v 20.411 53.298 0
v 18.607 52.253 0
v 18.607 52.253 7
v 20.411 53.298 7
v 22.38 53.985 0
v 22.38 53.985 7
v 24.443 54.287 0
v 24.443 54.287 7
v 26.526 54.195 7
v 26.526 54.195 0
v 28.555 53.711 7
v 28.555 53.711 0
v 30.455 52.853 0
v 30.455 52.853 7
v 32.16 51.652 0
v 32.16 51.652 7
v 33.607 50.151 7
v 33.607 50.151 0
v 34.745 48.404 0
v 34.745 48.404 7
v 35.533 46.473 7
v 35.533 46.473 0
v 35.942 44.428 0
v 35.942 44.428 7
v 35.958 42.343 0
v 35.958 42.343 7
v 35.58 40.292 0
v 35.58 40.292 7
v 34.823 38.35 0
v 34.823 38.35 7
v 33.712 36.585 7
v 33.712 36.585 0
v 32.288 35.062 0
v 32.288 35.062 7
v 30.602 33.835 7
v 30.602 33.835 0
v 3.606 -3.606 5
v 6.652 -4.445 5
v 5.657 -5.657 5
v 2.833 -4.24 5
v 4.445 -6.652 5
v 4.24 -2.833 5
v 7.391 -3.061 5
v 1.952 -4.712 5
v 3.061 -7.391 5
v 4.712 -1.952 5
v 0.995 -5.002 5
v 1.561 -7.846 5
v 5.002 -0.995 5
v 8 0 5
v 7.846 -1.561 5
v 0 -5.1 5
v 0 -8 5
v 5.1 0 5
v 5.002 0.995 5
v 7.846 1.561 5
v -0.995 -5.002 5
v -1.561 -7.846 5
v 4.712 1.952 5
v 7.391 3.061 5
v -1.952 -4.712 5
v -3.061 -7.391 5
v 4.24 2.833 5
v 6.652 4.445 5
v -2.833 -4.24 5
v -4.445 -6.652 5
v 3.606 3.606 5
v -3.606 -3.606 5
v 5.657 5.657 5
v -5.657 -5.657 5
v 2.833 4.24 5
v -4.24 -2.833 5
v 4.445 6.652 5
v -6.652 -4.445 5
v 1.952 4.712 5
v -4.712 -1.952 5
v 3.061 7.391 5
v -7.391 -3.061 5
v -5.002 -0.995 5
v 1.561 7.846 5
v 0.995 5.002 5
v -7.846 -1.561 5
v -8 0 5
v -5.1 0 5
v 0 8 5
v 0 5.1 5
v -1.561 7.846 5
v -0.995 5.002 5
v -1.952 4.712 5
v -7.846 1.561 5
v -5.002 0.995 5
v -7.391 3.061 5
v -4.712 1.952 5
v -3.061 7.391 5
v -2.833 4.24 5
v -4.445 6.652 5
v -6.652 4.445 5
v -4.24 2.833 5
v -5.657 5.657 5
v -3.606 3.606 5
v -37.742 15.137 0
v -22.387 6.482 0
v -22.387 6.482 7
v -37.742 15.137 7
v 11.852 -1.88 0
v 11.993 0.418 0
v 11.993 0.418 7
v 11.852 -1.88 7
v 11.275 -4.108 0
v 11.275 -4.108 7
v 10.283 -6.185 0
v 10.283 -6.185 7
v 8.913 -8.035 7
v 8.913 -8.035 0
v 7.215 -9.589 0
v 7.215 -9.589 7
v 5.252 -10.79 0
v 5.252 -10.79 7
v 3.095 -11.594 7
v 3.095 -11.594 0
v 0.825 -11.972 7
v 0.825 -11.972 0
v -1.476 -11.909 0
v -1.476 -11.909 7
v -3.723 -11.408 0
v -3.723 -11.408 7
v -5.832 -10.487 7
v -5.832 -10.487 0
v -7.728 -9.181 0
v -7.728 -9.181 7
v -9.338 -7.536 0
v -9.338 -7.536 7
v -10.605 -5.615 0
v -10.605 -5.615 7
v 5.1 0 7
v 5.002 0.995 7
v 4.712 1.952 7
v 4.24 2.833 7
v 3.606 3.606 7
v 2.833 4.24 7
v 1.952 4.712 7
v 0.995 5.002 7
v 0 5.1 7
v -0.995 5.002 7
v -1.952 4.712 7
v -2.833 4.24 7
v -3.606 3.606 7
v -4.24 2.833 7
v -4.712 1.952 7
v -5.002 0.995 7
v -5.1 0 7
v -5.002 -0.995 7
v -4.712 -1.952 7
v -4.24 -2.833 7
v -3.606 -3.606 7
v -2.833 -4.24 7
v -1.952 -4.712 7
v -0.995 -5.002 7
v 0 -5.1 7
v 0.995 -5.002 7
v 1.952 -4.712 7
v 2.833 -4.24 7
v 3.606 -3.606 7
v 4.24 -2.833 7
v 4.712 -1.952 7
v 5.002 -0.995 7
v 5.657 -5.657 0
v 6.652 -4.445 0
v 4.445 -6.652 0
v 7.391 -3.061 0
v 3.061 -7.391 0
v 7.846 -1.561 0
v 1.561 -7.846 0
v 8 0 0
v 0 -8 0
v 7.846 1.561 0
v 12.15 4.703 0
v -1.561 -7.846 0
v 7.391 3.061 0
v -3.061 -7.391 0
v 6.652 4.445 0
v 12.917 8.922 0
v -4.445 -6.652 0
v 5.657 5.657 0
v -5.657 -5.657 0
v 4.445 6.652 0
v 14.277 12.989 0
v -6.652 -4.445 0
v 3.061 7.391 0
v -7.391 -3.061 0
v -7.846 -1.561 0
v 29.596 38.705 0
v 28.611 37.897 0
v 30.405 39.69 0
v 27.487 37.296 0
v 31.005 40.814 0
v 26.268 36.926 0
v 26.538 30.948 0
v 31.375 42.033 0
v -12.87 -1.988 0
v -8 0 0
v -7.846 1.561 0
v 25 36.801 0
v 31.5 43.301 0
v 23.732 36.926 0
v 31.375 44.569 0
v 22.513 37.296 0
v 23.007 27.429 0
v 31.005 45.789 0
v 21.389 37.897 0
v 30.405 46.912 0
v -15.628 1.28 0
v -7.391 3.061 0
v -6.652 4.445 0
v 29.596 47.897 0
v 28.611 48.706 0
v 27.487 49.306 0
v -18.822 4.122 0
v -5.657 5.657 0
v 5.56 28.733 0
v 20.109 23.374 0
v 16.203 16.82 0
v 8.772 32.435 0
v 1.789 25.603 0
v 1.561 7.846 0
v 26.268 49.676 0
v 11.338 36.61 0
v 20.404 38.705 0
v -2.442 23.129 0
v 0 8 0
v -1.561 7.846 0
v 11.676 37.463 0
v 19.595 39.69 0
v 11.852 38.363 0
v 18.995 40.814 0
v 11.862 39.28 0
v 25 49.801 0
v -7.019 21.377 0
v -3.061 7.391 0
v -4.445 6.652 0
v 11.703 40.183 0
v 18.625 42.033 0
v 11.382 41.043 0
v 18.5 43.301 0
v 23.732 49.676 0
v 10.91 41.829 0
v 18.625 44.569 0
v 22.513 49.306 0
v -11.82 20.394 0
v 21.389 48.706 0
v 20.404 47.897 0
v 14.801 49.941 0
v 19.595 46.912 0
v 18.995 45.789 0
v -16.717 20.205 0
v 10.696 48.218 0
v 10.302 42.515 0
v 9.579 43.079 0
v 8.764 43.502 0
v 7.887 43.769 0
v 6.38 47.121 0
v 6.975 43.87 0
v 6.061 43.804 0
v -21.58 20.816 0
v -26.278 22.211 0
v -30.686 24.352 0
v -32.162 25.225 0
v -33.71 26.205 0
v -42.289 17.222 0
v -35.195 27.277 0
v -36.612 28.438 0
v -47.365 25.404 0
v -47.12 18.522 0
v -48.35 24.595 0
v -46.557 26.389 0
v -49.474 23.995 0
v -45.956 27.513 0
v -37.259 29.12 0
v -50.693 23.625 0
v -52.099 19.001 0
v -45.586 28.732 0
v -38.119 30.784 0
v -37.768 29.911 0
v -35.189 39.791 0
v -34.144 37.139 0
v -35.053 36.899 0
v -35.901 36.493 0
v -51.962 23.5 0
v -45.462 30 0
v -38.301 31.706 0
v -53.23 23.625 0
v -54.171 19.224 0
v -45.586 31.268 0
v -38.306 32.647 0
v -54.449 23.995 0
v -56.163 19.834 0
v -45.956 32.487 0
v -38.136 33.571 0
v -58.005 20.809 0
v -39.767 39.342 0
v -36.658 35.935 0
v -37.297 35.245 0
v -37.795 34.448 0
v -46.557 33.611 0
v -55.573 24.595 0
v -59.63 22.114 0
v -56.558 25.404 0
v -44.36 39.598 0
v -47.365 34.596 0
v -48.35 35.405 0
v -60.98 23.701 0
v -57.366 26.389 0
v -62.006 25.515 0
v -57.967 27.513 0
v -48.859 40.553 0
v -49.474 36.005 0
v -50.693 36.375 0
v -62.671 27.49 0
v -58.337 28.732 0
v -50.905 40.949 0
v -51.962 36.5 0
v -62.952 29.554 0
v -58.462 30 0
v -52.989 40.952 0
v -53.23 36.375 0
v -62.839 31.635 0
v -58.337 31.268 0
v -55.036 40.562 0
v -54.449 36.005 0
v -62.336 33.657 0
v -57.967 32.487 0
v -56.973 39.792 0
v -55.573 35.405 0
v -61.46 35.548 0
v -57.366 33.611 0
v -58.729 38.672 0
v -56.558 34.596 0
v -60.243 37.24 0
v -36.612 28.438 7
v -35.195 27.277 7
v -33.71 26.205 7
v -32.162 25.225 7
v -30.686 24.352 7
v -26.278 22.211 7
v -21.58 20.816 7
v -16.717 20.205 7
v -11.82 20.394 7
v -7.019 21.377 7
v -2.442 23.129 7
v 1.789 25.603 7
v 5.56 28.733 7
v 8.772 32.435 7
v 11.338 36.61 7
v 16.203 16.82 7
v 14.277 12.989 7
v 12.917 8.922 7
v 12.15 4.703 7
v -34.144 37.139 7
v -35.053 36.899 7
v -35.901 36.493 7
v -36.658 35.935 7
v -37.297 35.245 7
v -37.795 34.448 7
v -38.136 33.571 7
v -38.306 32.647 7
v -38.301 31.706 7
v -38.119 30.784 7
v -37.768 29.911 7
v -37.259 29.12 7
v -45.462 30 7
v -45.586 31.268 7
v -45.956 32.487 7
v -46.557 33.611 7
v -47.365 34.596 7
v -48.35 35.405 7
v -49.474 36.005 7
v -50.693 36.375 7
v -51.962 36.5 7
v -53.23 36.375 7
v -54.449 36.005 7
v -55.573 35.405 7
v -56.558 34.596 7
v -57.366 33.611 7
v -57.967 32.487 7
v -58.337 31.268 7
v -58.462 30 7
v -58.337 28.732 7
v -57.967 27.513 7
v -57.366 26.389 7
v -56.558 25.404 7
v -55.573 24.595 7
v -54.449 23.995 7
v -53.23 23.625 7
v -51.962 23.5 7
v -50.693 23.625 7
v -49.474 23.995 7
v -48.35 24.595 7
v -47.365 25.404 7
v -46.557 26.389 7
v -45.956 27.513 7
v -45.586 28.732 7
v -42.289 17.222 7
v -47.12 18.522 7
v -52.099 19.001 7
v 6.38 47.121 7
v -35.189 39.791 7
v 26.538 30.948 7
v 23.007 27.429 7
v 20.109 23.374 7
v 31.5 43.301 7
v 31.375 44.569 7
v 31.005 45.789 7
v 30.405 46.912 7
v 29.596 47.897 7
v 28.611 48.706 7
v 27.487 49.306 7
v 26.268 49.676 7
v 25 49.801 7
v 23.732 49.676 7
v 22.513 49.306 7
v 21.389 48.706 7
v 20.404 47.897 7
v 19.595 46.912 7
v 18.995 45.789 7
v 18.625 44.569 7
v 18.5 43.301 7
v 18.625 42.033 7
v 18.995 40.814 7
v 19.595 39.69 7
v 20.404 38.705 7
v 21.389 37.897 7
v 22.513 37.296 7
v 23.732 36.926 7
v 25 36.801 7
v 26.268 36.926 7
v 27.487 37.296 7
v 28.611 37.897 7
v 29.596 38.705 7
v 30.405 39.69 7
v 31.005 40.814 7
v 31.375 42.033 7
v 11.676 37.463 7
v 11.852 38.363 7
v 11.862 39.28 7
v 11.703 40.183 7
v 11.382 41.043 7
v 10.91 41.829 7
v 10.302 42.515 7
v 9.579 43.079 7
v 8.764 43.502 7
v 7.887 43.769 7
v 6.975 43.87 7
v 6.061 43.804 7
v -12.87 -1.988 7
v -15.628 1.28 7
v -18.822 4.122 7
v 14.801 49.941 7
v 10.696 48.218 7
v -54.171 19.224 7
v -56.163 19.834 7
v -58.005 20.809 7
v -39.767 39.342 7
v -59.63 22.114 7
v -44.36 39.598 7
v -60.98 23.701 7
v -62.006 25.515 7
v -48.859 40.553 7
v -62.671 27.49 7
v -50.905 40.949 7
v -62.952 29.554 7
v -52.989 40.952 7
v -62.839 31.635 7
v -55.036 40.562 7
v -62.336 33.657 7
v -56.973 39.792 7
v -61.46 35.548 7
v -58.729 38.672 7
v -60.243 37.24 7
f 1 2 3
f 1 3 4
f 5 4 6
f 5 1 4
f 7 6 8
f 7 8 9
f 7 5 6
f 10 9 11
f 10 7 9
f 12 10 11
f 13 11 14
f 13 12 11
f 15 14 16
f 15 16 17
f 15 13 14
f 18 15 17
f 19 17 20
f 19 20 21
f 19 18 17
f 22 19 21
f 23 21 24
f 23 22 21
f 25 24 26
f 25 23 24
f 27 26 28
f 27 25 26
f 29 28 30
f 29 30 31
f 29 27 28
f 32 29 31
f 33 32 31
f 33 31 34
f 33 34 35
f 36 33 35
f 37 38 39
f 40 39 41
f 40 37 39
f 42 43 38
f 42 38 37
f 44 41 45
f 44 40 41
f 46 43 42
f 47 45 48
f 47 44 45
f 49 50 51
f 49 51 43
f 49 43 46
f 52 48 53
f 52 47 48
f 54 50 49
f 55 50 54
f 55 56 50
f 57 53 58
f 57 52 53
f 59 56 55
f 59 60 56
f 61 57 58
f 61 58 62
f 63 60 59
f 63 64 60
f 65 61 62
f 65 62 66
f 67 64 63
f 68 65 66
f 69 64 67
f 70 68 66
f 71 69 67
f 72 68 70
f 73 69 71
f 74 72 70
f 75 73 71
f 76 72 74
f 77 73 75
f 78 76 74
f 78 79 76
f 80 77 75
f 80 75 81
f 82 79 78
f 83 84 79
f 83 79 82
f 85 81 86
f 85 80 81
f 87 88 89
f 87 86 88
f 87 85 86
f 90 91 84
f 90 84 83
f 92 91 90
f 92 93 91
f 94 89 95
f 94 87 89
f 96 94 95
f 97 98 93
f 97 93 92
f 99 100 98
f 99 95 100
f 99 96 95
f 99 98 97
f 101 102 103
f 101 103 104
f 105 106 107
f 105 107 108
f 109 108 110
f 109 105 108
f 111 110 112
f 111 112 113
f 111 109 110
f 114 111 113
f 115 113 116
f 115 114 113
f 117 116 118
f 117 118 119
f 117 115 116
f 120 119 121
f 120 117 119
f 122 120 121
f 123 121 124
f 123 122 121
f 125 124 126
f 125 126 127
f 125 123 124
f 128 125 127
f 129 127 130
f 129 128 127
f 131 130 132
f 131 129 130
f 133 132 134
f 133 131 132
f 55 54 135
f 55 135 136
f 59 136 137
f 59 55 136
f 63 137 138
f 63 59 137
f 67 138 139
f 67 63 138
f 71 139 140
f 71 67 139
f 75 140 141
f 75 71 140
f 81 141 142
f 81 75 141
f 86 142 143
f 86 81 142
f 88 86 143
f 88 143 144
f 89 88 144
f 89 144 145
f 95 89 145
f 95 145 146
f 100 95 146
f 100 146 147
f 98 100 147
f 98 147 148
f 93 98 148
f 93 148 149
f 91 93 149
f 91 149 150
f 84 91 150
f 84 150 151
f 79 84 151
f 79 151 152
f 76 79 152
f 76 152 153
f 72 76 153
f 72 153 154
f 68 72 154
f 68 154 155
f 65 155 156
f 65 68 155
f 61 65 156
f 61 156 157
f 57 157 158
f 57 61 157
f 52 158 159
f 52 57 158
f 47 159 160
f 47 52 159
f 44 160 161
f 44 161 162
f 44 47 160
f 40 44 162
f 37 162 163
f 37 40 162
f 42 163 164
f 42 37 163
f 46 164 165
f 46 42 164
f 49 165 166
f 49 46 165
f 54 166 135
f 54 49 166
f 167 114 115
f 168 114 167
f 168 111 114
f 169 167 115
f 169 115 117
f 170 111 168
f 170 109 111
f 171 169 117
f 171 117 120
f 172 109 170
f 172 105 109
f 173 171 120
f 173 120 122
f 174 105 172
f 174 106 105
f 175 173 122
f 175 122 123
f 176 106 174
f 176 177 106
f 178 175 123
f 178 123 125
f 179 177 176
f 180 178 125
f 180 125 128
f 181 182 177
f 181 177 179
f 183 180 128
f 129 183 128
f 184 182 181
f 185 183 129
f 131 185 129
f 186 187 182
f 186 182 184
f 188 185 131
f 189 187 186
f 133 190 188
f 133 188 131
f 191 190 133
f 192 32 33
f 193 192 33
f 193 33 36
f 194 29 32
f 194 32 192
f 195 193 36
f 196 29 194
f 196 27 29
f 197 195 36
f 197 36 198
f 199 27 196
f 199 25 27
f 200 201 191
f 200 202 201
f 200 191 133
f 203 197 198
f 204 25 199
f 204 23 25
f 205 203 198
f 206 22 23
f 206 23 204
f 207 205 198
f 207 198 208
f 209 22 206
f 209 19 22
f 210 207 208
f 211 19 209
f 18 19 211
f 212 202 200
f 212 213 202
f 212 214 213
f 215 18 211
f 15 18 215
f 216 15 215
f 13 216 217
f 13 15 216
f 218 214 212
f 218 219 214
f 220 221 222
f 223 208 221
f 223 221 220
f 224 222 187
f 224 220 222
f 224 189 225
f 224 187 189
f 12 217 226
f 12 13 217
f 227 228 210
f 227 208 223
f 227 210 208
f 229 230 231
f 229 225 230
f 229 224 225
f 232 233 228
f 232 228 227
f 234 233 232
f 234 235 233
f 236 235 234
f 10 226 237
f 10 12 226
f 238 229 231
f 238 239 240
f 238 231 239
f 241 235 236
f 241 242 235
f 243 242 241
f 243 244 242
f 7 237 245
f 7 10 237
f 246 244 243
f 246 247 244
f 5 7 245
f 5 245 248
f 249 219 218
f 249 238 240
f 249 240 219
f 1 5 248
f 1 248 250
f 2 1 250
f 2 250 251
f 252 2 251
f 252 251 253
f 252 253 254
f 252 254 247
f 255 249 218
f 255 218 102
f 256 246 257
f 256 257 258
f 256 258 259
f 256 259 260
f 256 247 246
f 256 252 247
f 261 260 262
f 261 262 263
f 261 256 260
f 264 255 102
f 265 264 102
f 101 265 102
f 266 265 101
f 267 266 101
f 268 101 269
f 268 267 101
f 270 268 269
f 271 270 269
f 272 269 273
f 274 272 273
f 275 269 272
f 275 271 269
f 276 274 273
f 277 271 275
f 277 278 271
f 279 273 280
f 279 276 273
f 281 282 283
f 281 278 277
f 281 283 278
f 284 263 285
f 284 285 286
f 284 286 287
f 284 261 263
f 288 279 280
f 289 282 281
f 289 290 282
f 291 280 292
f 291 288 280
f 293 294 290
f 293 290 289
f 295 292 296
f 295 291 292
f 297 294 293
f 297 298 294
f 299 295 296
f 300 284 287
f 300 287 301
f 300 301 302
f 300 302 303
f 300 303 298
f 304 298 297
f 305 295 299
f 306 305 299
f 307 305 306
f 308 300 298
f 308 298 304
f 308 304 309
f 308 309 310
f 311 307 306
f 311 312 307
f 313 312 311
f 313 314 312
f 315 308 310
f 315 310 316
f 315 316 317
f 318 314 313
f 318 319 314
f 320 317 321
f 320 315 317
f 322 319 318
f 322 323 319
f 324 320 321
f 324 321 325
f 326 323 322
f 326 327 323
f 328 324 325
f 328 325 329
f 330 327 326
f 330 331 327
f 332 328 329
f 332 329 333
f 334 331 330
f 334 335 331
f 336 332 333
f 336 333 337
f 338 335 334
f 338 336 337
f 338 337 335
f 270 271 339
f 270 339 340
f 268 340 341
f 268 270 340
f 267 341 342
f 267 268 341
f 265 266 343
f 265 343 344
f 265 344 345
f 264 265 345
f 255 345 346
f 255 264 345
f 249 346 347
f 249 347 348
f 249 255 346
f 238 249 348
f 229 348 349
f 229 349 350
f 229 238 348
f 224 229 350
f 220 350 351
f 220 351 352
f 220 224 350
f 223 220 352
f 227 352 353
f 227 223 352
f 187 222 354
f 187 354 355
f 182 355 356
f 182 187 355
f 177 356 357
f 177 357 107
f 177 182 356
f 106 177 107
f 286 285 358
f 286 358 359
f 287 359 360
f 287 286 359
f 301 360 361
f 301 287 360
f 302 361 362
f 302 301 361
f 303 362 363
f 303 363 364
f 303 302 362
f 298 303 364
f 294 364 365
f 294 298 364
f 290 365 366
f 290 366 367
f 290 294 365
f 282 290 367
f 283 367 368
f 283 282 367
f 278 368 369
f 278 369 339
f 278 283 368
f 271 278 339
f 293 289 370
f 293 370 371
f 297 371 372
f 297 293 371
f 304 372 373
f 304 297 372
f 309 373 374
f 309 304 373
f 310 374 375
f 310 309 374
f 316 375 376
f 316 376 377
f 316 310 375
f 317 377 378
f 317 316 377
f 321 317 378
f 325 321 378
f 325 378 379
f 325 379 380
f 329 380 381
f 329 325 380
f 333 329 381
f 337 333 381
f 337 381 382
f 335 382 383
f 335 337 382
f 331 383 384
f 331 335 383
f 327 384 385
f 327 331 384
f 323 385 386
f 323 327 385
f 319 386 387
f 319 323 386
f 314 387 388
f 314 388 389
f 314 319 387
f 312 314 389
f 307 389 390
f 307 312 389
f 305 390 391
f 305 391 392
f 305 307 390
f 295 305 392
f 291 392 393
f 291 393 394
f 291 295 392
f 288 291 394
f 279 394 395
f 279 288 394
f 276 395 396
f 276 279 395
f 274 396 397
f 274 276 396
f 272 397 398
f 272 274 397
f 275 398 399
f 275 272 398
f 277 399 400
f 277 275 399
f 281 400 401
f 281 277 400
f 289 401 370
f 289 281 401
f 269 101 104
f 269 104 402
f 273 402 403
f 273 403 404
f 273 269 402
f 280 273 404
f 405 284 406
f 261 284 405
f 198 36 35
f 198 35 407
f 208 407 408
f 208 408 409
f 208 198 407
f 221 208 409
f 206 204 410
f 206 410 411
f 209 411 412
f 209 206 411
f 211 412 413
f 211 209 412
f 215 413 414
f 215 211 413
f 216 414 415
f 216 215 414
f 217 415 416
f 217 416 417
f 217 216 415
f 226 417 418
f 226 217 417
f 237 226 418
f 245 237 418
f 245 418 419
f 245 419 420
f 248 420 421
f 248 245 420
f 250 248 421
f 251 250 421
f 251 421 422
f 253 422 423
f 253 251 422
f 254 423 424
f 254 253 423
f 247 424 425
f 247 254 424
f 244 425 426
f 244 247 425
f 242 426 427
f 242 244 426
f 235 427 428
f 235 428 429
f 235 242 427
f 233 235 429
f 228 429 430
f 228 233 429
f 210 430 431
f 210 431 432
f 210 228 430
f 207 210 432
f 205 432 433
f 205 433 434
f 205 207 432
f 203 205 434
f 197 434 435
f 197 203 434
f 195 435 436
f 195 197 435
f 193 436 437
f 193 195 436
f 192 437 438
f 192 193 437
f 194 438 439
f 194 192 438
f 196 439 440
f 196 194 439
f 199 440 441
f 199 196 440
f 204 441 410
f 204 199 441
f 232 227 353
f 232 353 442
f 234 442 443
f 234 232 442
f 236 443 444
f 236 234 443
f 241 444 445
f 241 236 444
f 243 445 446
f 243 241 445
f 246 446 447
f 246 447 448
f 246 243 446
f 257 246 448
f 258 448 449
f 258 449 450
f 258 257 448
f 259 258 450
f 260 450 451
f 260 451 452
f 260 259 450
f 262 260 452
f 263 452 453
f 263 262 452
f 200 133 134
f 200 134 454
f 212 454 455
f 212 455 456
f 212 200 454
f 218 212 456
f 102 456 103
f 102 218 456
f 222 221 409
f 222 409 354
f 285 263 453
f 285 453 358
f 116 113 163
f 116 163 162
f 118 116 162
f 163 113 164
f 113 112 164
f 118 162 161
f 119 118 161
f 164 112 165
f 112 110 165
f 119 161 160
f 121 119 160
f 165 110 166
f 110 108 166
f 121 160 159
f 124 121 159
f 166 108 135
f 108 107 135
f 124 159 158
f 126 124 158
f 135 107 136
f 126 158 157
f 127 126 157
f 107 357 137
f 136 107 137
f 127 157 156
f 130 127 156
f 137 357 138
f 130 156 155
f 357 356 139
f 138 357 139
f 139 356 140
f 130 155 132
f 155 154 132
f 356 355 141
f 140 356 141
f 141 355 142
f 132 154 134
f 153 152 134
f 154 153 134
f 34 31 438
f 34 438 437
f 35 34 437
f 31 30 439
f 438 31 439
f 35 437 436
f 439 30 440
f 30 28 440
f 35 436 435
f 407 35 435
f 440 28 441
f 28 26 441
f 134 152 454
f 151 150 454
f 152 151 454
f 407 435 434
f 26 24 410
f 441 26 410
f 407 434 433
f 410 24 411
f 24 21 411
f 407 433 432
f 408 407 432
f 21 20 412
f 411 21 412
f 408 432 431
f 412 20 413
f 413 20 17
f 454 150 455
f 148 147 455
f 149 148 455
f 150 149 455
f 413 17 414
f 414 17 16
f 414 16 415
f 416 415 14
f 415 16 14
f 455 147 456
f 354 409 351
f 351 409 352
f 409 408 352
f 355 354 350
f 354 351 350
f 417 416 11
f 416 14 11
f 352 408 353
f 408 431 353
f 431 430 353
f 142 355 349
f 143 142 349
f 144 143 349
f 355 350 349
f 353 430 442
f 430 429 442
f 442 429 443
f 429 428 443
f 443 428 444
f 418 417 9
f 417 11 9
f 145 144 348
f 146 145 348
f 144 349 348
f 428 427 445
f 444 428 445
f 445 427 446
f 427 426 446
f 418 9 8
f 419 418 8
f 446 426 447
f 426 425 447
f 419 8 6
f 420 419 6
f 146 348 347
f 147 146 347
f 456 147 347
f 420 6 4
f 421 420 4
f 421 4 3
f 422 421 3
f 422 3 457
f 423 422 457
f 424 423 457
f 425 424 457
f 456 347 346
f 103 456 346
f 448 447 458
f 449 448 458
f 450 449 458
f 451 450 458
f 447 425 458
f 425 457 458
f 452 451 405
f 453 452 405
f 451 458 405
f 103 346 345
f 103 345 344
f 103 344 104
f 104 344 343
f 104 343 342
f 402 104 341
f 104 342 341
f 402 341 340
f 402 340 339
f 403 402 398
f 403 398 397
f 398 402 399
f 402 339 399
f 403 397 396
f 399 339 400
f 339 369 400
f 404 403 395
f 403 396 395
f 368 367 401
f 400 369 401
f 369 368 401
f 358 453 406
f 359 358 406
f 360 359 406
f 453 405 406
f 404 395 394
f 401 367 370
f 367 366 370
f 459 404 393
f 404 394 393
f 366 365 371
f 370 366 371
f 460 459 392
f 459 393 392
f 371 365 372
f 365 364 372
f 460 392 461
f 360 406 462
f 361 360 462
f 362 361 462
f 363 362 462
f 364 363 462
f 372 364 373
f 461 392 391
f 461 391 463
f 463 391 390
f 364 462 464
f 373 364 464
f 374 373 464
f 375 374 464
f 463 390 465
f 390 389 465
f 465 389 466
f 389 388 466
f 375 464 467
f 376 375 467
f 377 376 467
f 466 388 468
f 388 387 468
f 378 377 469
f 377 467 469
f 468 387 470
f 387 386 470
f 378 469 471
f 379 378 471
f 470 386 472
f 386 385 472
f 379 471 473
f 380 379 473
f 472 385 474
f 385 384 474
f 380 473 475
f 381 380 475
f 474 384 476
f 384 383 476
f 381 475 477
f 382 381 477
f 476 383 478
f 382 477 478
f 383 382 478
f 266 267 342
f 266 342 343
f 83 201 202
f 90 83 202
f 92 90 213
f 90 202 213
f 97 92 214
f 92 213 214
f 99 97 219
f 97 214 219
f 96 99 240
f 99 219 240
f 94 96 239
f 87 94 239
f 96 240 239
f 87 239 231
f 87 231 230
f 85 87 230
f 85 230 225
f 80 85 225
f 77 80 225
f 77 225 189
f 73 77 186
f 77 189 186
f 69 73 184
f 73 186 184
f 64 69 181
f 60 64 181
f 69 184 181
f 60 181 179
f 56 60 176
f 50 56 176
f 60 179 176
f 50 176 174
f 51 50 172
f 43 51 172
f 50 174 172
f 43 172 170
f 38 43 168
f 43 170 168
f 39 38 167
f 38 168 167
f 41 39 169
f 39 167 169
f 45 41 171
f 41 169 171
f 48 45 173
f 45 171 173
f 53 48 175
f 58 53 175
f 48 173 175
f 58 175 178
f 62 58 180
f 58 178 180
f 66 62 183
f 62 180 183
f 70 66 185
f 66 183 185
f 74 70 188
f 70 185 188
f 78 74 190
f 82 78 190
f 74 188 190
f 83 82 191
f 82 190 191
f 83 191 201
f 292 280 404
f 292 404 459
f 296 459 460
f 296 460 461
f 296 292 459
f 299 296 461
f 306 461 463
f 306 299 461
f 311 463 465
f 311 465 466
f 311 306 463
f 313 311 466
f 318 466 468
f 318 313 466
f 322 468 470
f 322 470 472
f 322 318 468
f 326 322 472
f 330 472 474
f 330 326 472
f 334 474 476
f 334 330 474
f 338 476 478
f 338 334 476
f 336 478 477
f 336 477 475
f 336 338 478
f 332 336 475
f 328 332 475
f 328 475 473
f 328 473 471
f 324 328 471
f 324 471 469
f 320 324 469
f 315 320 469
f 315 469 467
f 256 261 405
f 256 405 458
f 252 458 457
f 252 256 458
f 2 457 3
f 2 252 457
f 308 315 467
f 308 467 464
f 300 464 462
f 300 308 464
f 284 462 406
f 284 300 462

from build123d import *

# Parameters (mm, degrees)
SKETCH_3_R          = 6.5
SKETCH_3_R_2        = 5.1
EXTRUDE_1_DEPTH     = 7
SKETCH_4_R          = 8
CUT_EXTRUDE_1_DEPTH = 5


with BuildPart() as part:
    # 草图3 → 凸台-拉伸1 (new body)
    with BuildSketch(Plane.XY):
        with BuildLine():
            Line((-22.387222404, 6.481913971), (-37.741822074, 15.137156625))
            ThreePointArc((-37.741822074, 15.137156625), (-44.677179157, 17.972501845), (-52.098826017, 19.000858921))
            ThreePointArc((-52.098826017, 19.000858921), (-62.839328708, 31.635038635), (-48.859263412, 40.553484096))
            ThreePointArc((-48.859263412, 40.553484096), (-42.068238936, 39.382208167), (-35.189110999, 39.791475278))
            Line((-35.189110999, 39.791475278), (6.380330607, 47.121287778))
            ThreePointArc((6.380330607, 47.121287778), (12.780626397, 49.003020007), (18.606824384, 52.252653742))
            ThreePointArc((18.606824384, 52.252653742), (34.217539735, 49.304351078), (30.601923927, 33.834566184))
            ThreePointArc((30.601923927, 33.834566184), (24.699361424, 29.262109391), (20.108758873, 23.373648349))
            Line((20.108758873, 23.373648349), (16.20338738, 16.820058769))
            ThreePointArc((16.20338738, 16.820058769), (12.916733667, 8.922247815), (11.992720655, 0.417913012))
            ThreePointArc((11.992720655, 0.417913012), (3.095129334, -11.593971468), (-10.60533968, -5.614870459))
            ThreePointArc((-10.60533968, -5.614870459), (-15.627603439, 1.279586072), (-22.387222404, 6.481913971))
        make_face()
        with Locations((-51.961523087, 30.000001974)):
            Circle(SKETCH_3_R, mode=Mode.SUBTRACT)
        with Locations((25.000001645, 43.30126924)):
            Circle(SKETCH_3_R, mode=Mode.SUBTRACT)
        Circle(SKETCH_3_R_2, mode=Mode.SUBTRACT)
        with BuildLine():
            Line((6.06060926, 43.804004569), (-34.143508536, 37.139474198))
            ThreePointArc((-34.143508536, 37.139474198), (-38.136023536, 33.571352415), (-36.611887481, 28.438256042))
            ThreePointArc((-36.611887481, 28.438256042), (-34.460833245, 26.729480075), (-32.162485272, 25.224639143))
            Line((-32.162485272, 25.224639143), (-30.686333973, 24.351977435))
            ThreePointArc((-30.686333973, 24.351977435), (-7.018632683, 21.377002096), (11.337823614, 36.610224829))
            ThreePointArc((11.337823614, 36.610224829), (10.909838082, 41.82878296), (6.06060926, 43.804004569))
        make_face(mode=Mode.SUBTRACT)
    extrude(amount=EXTRUDE_1_DEPTH)

    # 草图4 → 切除-拉伸1 (cut)
    with BuildSketch(Plane(origin=(0, 0, 0), x_dir=(-1, 0, 0), z_dir=(0, 0, -1))):
        Circle(SKETCH_4_R)
    extrude(amount=-CUT_EXTRUDE_1_DEPTH, mode=Mode.SUBTRACT)


solid = part.part
